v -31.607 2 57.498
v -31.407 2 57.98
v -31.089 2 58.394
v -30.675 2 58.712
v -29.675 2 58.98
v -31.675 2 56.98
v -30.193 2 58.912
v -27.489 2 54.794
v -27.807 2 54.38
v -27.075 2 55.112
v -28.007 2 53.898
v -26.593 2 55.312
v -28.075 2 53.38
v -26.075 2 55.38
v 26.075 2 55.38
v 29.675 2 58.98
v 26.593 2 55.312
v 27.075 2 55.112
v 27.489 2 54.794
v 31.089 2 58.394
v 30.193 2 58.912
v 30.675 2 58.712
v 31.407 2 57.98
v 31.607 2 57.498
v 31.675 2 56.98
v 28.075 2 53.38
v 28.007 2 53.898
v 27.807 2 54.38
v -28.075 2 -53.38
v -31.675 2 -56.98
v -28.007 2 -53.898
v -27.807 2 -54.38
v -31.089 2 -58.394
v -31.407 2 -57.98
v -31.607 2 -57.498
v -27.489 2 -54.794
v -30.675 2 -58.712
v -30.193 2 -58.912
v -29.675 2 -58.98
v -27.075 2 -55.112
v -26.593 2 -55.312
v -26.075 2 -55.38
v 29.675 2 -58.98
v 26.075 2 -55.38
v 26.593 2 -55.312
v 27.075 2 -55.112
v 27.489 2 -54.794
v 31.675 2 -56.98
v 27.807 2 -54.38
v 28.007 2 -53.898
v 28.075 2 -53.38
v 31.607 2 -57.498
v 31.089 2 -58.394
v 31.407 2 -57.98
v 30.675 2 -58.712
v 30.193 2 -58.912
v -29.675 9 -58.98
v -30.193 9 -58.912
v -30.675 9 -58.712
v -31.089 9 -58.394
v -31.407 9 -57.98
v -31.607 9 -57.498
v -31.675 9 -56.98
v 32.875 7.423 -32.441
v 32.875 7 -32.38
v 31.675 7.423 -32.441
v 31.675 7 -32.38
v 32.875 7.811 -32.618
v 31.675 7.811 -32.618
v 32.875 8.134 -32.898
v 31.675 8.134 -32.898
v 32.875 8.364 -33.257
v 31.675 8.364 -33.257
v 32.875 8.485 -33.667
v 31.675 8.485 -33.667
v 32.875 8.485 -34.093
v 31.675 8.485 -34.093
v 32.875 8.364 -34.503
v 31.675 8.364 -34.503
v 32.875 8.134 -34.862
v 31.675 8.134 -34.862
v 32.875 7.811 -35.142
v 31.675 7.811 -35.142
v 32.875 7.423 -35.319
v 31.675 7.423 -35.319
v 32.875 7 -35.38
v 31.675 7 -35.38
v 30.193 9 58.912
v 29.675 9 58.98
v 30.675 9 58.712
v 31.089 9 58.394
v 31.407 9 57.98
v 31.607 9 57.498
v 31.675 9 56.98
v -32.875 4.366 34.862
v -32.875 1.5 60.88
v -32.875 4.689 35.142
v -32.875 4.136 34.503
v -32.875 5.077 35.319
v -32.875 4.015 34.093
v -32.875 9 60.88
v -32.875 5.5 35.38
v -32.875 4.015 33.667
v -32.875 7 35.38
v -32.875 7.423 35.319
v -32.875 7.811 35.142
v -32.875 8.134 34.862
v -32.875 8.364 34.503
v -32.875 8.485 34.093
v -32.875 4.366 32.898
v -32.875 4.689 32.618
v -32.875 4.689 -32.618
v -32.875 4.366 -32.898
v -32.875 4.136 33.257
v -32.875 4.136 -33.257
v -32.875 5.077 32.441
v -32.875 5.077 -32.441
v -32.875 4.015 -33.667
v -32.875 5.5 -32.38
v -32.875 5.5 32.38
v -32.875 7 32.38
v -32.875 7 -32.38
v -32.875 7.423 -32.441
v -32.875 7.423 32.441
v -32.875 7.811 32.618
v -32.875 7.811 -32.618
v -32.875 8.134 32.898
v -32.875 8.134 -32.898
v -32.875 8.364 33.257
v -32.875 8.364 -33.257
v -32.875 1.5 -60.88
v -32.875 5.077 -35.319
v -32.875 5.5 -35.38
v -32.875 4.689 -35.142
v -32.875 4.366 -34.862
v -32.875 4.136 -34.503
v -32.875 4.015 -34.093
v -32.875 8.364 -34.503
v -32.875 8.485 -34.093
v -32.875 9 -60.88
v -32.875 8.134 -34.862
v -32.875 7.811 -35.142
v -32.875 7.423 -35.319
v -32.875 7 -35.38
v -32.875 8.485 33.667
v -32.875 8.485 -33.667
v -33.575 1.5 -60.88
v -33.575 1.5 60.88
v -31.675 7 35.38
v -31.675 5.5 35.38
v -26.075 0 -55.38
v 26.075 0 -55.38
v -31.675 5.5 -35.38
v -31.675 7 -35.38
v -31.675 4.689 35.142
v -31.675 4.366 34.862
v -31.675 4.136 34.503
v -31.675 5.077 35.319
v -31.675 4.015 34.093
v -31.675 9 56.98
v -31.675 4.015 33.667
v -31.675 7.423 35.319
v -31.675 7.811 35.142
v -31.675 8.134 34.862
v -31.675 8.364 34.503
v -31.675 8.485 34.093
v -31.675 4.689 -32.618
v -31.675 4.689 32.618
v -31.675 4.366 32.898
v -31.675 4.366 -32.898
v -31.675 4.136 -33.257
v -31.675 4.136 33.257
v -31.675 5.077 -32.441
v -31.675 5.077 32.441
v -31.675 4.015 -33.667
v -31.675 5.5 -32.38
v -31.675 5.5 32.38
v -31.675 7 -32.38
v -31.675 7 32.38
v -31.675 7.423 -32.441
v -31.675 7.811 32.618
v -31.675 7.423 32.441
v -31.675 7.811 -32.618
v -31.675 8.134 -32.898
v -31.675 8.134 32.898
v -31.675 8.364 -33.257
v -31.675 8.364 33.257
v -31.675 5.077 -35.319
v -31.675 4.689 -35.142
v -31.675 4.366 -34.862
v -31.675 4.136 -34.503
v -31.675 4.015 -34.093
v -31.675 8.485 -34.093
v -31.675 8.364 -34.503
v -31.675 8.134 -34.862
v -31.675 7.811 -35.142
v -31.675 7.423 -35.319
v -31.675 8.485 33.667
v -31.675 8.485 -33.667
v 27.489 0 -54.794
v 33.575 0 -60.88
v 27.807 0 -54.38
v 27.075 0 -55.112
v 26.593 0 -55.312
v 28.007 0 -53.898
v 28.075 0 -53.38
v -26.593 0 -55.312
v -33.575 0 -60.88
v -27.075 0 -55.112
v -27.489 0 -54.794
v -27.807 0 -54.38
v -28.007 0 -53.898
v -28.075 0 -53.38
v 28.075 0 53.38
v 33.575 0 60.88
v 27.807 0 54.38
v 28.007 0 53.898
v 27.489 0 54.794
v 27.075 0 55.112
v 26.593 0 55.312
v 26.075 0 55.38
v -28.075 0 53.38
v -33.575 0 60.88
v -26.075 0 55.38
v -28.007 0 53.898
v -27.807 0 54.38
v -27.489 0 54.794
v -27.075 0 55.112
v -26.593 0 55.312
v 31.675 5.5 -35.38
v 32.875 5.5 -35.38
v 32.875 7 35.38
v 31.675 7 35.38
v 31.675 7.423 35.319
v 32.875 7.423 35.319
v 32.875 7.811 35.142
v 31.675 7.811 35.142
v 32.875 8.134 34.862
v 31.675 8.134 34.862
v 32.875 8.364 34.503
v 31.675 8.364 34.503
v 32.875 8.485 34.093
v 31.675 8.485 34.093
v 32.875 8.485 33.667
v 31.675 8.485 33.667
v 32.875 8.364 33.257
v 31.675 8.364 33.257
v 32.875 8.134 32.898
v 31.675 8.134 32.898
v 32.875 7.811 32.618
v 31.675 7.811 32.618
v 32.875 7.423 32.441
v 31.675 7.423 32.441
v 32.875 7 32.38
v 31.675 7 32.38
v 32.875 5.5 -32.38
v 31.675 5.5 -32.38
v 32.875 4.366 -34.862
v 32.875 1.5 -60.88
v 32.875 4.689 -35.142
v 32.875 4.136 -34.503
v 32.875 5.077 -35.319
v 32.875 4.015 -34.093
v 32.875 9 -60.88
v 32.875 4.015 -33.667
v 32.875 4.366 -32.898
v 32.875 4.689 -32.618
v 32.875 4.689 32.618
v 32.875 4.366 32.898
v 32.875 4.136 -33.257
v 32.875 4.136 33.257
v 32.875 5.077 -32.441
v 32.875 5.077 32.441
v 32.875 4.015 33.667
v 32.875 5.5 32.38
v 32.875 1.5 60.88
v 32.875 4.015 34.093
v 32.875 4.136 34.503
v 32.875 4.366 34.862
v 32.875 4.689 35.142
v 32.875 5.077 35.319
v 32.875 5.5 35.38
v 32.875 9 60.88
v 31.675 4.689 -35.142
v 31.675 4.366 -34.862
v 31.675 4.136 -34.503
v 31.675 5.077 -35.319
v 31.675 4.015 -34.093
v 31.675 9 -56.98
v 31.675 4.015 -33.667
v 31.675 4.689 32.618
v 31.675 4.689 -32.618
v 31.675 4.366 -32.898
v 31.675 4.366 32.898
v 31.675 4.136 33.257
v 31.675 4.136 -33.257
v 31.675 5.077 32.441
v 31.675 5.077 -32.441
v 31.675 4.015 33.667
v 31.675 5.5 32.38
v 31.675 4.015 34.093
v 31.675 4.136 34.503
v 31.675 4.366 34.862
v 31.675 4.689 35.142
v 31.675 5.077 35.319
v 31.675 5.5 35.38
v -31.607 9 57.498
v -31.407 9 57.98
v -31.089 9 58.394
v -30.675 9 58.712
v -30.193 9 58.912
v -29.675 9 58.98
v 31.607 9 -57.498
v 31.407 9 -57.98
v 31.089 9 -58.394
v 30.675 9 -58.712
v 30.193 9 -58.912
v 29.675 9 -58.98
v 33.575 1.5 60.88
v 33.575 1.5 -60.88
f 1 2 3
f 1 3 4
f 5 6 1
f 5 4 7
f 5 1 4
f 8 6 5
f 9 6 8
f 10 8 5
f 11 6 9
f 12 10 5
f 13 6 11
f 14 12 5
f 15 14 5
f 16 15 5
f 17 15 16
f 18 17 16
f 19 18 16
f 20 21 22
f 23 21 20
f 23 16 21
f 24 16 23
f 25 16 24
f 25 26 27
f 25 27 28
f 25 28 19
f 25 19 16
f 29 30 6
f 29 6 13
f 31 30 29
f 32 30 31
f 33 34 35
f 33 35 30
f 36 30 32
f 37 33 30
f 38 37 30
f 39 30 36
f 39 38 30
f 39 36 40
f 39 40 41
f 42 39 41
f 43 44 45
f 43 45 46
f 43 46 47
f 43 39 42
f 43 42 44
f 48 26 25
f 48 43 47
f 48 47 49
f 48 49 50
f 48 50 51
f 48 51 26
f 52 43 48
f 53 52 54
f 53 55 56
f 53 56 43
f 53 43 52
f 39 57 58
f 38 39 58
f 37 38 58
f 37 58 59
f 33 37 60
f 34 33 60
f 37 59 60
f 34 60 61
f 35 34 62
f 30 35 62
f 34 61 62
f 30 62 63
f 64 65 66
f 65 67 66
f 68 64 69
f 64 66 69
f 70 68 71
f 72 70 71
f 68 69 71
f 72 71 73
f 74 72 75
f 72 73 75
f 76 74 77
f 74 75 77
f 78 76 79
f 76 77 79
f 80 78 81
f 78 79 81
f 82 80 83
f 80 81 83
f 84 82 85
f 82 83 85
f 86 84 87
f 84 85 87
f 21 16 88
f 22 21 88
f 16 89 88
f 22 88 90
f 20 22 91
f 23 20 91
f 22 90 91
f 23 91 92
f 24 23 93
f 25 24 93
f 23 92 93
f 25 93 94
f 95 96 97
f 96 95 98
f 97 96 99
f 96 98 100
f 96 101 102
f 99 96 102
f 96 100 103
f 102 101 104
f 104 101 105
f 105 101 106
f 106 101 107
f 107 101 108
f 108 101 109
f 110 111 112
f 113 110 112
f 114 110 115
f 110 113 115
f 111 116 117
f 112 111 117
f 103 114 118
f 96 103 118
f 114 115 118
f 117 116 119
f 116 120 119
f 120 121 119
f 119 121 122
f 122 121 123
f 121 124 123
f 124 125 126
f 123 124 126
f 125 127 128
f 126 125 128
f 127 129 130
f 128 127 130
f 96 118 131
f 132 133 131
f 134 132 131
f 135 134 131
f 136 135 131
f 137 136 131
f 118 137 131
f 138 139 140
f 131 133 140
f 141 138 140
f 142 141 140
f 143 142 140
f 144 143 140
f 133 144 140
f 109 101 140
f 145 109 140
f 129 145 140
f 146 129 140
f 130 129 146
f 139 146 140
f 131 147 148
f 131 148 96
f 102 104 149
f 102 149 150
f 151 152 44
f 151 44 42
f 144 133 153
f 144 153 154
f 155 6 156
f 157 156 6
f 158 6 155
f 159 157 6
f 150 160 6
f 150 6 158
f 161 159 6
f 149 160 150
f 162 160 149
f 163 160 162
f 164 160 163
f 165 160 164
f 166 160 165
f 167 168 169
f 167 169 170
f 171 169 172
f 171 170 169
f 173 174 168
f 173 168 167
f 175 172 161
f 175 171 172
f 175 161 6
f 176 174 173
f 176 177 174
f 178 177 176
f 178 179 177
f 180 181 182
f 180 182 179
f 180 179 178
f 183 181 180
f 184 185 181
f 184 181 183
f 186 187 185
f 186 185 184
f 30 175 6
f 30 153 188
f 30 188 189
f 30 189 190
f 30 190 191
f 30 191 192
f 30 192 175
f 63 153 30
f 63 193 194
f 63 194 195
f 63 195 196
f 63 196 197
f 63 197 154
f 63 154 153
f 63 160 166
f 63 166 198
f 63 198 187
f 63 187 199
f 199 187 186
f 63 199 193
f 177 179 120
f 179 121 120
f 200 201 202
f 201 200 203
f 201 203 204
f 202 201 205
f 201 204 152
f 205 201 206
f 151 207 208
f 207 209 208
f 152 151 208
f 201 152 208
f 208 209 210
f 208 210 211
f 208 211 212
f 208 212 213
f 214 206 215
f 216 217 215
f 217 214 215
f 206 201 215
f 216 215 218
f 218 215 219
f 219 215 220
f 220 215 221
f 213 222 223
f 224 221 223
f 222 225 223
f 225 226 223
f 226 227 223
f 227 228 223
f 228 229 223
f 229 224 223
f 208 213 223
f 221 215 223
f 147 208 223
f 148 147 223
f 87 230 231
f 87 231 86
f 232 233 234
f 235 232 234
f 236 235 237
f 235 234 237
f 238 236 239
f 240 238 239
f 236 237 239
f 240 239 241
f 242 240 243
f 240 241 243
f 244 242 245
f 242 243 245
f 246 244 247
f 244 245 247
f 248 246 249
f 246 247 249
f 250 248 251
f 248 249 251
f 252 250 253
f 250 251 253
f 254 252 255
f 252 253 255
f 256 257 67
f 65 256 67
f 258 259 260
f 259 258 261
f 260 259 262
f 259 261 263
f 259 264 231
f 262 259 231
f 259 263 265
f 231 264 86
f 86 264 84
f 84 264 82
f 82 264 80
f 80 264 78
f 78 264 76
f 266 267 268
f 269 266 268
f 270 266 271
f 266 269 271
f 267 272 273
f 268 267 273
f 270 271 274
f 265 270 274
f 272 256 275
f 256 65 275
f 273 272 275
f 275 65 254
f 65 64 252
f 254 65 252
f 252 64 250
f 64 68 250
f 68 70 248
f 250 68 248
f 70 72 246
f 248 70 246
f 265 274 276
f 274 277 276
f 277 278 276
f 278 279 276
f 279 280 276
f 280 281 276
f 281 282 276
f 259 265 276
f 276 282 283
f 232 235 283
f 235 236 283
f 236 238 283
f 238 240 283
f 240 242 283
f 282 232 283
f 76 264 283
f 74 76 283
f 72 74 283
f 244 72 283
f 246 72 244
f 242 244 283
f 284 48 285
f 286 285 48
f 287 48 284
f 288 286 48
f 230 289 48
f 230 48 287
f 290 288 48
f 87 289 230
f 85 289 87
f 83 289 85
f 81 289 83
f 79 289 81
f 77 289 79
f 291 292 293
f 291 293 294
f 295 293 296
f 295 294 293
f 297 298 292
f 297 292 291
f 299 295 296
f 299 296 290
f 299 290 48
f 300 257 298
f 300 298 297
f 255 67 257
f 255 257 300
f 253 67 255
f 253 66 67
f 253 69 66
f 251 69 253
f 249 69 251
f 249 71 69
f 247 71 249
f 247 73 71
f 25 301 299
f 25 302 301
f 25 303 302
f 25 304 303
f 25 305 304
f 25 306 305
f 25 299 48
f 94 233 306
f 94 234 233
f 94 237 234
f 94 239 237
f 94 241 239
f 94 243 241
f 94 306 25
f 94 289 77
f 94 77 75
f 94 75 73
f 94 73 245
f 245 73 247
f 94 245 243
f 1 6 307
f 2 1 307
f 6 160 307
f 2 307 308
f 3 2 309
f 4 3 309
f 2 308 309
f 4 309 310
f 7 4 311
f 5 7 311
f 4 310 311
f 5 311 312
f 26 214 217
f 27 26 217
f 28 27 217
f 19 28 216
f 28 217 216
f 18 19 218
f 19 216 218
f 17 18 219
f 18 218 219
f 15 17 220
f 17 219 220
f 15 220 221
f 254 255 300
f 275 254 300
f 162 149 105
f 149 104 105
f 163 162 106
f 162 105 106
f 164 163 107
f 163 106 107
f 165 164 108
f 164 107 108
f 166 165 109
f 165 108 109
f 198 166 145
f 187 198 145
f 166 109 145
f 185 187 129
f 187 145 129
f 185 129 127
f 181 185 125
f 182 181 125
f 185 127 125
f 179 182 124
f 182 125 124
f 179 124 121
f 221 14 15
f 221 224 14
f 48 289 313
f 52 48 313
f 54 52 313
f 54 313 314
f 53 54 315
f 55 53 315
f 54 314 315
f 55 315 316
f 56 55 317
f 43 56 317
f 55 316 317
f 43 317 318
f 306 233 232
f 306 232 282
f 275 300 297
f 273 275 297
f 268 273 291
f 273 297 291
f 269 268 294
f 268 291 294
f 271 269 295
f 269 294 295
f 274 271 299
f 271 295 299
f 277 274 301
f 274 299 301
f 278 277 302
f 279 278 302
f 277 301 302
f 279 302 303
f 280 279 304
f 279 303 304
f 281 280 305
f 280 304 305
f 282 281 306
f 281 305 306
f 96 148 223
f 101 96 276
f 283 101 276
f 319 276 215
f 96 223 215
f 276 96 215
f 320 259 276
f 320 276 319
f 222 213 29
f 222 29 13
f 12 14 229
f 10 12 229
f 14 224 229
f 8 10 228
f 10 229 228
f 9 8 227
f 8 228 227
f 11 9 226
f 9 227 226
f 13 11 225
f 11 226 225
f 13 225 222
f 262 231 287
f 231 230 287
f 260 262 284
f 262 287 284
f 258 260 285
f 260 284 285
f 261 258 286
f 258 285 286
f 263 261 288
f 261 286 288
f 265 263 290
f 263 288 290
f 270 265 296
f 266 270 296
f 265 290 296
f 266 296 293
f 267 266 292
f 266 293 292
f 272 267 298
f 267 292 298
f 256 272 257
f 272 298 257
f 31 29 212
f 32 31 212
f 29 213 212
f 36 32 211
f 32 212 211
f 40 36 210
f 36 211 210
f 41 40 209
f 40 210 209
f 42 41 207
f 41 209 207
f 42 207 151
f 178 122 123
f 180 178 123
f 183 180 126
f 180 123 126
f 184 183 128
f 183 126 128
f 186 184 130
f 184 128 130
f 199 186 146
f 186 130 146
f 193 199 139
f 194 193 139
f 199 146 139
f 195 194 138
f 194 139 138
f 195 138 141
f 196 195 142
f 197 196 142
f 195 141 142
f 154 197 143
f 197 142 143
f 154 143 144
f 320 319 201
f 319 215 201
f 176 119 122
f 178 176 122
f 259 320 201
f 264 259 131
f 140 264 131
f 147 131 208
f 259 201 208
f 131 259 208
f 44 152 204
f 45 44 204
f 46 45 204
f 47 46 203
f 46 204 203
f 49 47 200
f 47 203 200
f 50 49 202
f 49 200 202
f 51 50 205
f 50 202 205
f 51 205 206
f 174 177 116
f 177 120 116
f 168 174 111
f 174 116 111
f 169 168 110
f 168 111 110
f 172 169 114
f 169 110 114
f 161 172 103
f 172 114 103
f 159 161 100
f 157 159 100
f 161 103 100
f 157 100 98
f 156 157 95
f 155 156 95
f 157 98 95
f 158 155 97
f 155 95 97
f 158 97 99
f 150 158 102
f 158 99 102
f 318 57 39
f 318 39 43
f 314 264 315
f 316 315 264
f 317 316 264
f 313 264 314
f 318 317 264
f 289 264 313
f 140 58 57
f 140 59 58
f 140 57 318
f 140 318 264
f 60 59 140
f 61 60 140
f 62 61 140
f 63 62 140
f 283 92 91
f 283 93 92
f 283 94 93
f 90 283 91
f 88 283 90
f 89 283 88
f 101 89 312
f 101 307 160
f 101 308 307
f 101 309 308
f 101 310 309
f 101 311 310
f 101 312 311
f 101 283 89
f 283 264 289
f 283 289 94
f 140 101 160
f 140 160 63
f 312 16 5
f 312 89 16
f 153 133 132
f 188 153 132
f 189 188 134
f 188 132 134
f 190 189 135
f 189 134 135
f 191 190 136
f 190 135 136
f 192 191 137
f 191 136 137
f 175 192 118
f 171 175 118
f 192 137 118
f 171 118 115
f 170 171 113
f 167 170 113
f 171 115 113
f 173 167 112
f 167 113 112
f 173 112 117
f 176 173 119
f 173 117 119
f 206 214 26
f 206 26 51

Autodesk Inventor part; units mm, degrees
ref_plane "YZ Plane" through (0, 0, 0) normal (1, 0, 0) x (0, 1, 0)
ref_plane "XZ Plane" through (0, 0, 0) normal (0, 1, 0) x (-1, 0, 0)
ref_plane "XY Plane" through (0, 0, 0) normal (0, 0, 1) x (1, 0, 0)
sketch "Sketch1" plane through (0, 0, 0) normal (0, 1, 0) x (-1, 0, 0)
  line L0 (33.575, 60.88) -> (-33.575, 60.88)
  line L1 (-33.575, 60.88) -> (-33.575, -60.88)
  line L2 (-33.575, -60.88) -> (33.575, -60.88)
  line L3 (33.575, -60.88) -> (33.575, 60.88)
  line L4 (21.765, 52.07) -> (27.765, 52.07) construction
  line L5 (0, 0) -> (-80.4548, 0) construction
  line L6 (0, 0) -> (0, 46.6746) construction
  line L7 (28.575, 55.88) -> (-28.575, 55.88) construction
  line L8 (-28.575, 55.88) -> (-28.575, -55.88) construction
  line L9 (-28.575, -55.88) -> (28.575, -55.88) construction
  line L10 (28.575, -55.88) -> (28.575, 55.88) construction
  circle A0 centre (24.765, 52.07) radius 1.5 construction
  circle A1 centre (-24.765, 52.07) radius 1.5 construction
  circle A2 centre (24.765, -41.91) radius 3.8303 construction
  circle A3 centre (-24.765, -41.91) radius 3.8303 construction
  line L11 (26.075, 55.38) -> (-26.075, 55.38)
  line L12 (-26.075, -55.38) -> (26.075, -55.38)
  line L13 (28.575, 55.88) -> (-28.575, -55.88) construction
  line L14 (28.575, -55.88) -> (-28.575, 55.88) construction
  line L15 (28.075, -53.38) -> (28.075, 53.38)
  arc A4 (26.075, -55.38) -> (28.075, -53.38) centre (26.075, -53.38) ccw
  arc A5 (-28.075, -53.38) -> (-26.075, -55.38) centre (-26.075, -53.38) ccw
  line L16 (-28.075, 53.38) -> (-28.075, -53.38)
  arc A6 (28.075, 53.38) -> (26.075, 55.38) centre (26.075, 53.38) ccw
  arc A7 (-26.075, 55.38) -> (-28.075, 53.38) centre (-26.075, 53.38) ccw
  point P0 (28.075, 55.38)
  point P1 (-28.075, 55.38)
  dimension "d77" = 57.15
  dimension "d78" = 3.81
  dimension "d79" = 3.81
  dimension "d80" = 3.81
  dimension "d81" = 3.81
  dimension "d82" = 3
  dimension "d85" = 111.76
  dimension "d88" = 3.81
  dimension "d100" = 0.5
  dimension "d101" = 5
  dimension "d104" = 0.5
  dimension "d107" = 5
  dimension "d109" = 5
  dimension "d115" = 0.5
  dimension "d122" = 5
  dimension "d123" = 2
  dimension "d129" = 0.5
  dimension "d130" = 2
extrude "Extrusion1" add sketch "Sketch1" along normal blind 9
sketch "Sketch5" plane through (0, 9, 0) normal (0, 1, 0) x (1, 0, 0)
  line L0 (-29.675, 58.98) -> (29.675, 58.98)
  line L1 (31.675, 56.98) -> (31.675, -56.98)
  line L2 (29.675, -58.98) -> (-29.675, -58.98)
  line L3 (-31.675, -56.98) -> (-31.675, 56.98)
  line L4 (33.575, 60.88) -> (-33.575, 60.88) projected
  arc A0 (-29.675, 58.98) -> (-31.675, 56.98) centre (-29.675, 56.98) ccw
  arc A1 (31.675, 56.98) -> (29.675, 58.98) centre (29.675, 56.98) ccw
  arc A2 (29.675, -58.98) -> (31.675, -56.98) centre (29.675, -56.98) ccw
  arc A3 (-31.675, -56.98) -> (-29.675, -58.98) centre (-29.675, -56.98) ccw
  line L5 (-33.575, 60.88) -> (-33.575, -60.88) projected
  line L6 (33.575, -60.88) -> (33.575, 60.88) projected
  line L7 (-33.575, -60.88) -> (33.575, -60.88) projected
  point P0 (0, 0)
  point P1 (-31.675, 58.98)
  point P2 (31.675, -58.98)
  point P3 (31.675, 58.98)
  point P4 (-31.675, -58.98)
  dimension "d131" = 1.9
  dimension "d134" = 2
  dimension "d135" = 1.9
  dimension "d136" = 1.9
  dimension "d137" = 1.9
  dimension "d138" = 63.35
extrude "Extrusion5" cut sketch "Sketch5" against normal blind 7 contours L0 A1 L1 A2 L2 A3 L3 A0
sketch "Sketch6" plane through (-33.575, 0, -60.88) normal (-1, 0, 0) x (0, 0, 1)
  circle A0 centre (94.76, 7) radius 1.5
  circle A1 centre (27, 5.5) radius 1.5
  line L0 (0, 0) -> (121.76, 0) projected
  line L1 (121.76, 0) -> (121.76, 9) projected
  line L2 (0, 0) -> (0, 9) projected
  circle A2 centre (94.76, 5.5) radius 1.5
  line L3 (94.76, 7) -> (94.76, 5.5) construction
  line L4 (93.26, 7) -> (93.26, 5.5)
  line L5 (96.26, 7) -> (96.26, 5.5)
  circle A3 centre (27, 7) radius 1.5
  line L6 (27, 5.5) -> (27, 7) construction
  line L7 (28.5, 5.5) -> (28.5, 7)
  line L8 (25.5, 5.5) -> (25.5, 7)
  point P0 (60.88, 0)
  point P1 (28.5, 7)
  point P2 (25.5, 7)
  dimension "d139" = 3
  dimension "d140" = 7
  dimension "d141" = 5.5
  dimension "d142" = 27
  dimension "d143" = 27
  dimension "d146" = 3
  dimension "d147" = 3
  dimension "d148" = 1.5
  dimension "d149" = 1.5
extrude "Extrusion6" cut sketch "Sketch6" against normal blind 70
sketch "Sketch7" plane through (0, 9, 0) normal (0, 1, 0) x (1, 0, 0)
  line L0 (33.575, 60.88) -> (-33.575, 60.88) projected
  line L1 (-33.575, -60.88) -> (-32.875, -60.88)
  line L2 (-32.875, -60.88) -> (-32.875, 60.88)
  line L3 (-32.875, 60.88) -> (-33.575, 60.88)
  line L4 (-33.575, 60.88) -> (-33.575, -60.88)
  line L5 (-33.575, -60.88) -> (33.575, -60.88) projected
  line L6 (33.575, 60.88) -> (32.875, 60.88)
  line L7 (32.875, 60.88) -> (32.875, -60.88)
  line L8 (32.875, -60.88) -> (33.575, -60.88)
  line L9 (33.575, -60.88) -> (33.575, 60.88)
  point P0 (0, 0)
  dimension "d150" = 0.7
  dimension "d151" = 0.7
extrude "Extrusion7" cut sketch "Sketch7" against normal blind 7.5 contours L9 L5 L7 L0 | L2 L1 L4 L0
properties part number "RahmenV04_TOP"
